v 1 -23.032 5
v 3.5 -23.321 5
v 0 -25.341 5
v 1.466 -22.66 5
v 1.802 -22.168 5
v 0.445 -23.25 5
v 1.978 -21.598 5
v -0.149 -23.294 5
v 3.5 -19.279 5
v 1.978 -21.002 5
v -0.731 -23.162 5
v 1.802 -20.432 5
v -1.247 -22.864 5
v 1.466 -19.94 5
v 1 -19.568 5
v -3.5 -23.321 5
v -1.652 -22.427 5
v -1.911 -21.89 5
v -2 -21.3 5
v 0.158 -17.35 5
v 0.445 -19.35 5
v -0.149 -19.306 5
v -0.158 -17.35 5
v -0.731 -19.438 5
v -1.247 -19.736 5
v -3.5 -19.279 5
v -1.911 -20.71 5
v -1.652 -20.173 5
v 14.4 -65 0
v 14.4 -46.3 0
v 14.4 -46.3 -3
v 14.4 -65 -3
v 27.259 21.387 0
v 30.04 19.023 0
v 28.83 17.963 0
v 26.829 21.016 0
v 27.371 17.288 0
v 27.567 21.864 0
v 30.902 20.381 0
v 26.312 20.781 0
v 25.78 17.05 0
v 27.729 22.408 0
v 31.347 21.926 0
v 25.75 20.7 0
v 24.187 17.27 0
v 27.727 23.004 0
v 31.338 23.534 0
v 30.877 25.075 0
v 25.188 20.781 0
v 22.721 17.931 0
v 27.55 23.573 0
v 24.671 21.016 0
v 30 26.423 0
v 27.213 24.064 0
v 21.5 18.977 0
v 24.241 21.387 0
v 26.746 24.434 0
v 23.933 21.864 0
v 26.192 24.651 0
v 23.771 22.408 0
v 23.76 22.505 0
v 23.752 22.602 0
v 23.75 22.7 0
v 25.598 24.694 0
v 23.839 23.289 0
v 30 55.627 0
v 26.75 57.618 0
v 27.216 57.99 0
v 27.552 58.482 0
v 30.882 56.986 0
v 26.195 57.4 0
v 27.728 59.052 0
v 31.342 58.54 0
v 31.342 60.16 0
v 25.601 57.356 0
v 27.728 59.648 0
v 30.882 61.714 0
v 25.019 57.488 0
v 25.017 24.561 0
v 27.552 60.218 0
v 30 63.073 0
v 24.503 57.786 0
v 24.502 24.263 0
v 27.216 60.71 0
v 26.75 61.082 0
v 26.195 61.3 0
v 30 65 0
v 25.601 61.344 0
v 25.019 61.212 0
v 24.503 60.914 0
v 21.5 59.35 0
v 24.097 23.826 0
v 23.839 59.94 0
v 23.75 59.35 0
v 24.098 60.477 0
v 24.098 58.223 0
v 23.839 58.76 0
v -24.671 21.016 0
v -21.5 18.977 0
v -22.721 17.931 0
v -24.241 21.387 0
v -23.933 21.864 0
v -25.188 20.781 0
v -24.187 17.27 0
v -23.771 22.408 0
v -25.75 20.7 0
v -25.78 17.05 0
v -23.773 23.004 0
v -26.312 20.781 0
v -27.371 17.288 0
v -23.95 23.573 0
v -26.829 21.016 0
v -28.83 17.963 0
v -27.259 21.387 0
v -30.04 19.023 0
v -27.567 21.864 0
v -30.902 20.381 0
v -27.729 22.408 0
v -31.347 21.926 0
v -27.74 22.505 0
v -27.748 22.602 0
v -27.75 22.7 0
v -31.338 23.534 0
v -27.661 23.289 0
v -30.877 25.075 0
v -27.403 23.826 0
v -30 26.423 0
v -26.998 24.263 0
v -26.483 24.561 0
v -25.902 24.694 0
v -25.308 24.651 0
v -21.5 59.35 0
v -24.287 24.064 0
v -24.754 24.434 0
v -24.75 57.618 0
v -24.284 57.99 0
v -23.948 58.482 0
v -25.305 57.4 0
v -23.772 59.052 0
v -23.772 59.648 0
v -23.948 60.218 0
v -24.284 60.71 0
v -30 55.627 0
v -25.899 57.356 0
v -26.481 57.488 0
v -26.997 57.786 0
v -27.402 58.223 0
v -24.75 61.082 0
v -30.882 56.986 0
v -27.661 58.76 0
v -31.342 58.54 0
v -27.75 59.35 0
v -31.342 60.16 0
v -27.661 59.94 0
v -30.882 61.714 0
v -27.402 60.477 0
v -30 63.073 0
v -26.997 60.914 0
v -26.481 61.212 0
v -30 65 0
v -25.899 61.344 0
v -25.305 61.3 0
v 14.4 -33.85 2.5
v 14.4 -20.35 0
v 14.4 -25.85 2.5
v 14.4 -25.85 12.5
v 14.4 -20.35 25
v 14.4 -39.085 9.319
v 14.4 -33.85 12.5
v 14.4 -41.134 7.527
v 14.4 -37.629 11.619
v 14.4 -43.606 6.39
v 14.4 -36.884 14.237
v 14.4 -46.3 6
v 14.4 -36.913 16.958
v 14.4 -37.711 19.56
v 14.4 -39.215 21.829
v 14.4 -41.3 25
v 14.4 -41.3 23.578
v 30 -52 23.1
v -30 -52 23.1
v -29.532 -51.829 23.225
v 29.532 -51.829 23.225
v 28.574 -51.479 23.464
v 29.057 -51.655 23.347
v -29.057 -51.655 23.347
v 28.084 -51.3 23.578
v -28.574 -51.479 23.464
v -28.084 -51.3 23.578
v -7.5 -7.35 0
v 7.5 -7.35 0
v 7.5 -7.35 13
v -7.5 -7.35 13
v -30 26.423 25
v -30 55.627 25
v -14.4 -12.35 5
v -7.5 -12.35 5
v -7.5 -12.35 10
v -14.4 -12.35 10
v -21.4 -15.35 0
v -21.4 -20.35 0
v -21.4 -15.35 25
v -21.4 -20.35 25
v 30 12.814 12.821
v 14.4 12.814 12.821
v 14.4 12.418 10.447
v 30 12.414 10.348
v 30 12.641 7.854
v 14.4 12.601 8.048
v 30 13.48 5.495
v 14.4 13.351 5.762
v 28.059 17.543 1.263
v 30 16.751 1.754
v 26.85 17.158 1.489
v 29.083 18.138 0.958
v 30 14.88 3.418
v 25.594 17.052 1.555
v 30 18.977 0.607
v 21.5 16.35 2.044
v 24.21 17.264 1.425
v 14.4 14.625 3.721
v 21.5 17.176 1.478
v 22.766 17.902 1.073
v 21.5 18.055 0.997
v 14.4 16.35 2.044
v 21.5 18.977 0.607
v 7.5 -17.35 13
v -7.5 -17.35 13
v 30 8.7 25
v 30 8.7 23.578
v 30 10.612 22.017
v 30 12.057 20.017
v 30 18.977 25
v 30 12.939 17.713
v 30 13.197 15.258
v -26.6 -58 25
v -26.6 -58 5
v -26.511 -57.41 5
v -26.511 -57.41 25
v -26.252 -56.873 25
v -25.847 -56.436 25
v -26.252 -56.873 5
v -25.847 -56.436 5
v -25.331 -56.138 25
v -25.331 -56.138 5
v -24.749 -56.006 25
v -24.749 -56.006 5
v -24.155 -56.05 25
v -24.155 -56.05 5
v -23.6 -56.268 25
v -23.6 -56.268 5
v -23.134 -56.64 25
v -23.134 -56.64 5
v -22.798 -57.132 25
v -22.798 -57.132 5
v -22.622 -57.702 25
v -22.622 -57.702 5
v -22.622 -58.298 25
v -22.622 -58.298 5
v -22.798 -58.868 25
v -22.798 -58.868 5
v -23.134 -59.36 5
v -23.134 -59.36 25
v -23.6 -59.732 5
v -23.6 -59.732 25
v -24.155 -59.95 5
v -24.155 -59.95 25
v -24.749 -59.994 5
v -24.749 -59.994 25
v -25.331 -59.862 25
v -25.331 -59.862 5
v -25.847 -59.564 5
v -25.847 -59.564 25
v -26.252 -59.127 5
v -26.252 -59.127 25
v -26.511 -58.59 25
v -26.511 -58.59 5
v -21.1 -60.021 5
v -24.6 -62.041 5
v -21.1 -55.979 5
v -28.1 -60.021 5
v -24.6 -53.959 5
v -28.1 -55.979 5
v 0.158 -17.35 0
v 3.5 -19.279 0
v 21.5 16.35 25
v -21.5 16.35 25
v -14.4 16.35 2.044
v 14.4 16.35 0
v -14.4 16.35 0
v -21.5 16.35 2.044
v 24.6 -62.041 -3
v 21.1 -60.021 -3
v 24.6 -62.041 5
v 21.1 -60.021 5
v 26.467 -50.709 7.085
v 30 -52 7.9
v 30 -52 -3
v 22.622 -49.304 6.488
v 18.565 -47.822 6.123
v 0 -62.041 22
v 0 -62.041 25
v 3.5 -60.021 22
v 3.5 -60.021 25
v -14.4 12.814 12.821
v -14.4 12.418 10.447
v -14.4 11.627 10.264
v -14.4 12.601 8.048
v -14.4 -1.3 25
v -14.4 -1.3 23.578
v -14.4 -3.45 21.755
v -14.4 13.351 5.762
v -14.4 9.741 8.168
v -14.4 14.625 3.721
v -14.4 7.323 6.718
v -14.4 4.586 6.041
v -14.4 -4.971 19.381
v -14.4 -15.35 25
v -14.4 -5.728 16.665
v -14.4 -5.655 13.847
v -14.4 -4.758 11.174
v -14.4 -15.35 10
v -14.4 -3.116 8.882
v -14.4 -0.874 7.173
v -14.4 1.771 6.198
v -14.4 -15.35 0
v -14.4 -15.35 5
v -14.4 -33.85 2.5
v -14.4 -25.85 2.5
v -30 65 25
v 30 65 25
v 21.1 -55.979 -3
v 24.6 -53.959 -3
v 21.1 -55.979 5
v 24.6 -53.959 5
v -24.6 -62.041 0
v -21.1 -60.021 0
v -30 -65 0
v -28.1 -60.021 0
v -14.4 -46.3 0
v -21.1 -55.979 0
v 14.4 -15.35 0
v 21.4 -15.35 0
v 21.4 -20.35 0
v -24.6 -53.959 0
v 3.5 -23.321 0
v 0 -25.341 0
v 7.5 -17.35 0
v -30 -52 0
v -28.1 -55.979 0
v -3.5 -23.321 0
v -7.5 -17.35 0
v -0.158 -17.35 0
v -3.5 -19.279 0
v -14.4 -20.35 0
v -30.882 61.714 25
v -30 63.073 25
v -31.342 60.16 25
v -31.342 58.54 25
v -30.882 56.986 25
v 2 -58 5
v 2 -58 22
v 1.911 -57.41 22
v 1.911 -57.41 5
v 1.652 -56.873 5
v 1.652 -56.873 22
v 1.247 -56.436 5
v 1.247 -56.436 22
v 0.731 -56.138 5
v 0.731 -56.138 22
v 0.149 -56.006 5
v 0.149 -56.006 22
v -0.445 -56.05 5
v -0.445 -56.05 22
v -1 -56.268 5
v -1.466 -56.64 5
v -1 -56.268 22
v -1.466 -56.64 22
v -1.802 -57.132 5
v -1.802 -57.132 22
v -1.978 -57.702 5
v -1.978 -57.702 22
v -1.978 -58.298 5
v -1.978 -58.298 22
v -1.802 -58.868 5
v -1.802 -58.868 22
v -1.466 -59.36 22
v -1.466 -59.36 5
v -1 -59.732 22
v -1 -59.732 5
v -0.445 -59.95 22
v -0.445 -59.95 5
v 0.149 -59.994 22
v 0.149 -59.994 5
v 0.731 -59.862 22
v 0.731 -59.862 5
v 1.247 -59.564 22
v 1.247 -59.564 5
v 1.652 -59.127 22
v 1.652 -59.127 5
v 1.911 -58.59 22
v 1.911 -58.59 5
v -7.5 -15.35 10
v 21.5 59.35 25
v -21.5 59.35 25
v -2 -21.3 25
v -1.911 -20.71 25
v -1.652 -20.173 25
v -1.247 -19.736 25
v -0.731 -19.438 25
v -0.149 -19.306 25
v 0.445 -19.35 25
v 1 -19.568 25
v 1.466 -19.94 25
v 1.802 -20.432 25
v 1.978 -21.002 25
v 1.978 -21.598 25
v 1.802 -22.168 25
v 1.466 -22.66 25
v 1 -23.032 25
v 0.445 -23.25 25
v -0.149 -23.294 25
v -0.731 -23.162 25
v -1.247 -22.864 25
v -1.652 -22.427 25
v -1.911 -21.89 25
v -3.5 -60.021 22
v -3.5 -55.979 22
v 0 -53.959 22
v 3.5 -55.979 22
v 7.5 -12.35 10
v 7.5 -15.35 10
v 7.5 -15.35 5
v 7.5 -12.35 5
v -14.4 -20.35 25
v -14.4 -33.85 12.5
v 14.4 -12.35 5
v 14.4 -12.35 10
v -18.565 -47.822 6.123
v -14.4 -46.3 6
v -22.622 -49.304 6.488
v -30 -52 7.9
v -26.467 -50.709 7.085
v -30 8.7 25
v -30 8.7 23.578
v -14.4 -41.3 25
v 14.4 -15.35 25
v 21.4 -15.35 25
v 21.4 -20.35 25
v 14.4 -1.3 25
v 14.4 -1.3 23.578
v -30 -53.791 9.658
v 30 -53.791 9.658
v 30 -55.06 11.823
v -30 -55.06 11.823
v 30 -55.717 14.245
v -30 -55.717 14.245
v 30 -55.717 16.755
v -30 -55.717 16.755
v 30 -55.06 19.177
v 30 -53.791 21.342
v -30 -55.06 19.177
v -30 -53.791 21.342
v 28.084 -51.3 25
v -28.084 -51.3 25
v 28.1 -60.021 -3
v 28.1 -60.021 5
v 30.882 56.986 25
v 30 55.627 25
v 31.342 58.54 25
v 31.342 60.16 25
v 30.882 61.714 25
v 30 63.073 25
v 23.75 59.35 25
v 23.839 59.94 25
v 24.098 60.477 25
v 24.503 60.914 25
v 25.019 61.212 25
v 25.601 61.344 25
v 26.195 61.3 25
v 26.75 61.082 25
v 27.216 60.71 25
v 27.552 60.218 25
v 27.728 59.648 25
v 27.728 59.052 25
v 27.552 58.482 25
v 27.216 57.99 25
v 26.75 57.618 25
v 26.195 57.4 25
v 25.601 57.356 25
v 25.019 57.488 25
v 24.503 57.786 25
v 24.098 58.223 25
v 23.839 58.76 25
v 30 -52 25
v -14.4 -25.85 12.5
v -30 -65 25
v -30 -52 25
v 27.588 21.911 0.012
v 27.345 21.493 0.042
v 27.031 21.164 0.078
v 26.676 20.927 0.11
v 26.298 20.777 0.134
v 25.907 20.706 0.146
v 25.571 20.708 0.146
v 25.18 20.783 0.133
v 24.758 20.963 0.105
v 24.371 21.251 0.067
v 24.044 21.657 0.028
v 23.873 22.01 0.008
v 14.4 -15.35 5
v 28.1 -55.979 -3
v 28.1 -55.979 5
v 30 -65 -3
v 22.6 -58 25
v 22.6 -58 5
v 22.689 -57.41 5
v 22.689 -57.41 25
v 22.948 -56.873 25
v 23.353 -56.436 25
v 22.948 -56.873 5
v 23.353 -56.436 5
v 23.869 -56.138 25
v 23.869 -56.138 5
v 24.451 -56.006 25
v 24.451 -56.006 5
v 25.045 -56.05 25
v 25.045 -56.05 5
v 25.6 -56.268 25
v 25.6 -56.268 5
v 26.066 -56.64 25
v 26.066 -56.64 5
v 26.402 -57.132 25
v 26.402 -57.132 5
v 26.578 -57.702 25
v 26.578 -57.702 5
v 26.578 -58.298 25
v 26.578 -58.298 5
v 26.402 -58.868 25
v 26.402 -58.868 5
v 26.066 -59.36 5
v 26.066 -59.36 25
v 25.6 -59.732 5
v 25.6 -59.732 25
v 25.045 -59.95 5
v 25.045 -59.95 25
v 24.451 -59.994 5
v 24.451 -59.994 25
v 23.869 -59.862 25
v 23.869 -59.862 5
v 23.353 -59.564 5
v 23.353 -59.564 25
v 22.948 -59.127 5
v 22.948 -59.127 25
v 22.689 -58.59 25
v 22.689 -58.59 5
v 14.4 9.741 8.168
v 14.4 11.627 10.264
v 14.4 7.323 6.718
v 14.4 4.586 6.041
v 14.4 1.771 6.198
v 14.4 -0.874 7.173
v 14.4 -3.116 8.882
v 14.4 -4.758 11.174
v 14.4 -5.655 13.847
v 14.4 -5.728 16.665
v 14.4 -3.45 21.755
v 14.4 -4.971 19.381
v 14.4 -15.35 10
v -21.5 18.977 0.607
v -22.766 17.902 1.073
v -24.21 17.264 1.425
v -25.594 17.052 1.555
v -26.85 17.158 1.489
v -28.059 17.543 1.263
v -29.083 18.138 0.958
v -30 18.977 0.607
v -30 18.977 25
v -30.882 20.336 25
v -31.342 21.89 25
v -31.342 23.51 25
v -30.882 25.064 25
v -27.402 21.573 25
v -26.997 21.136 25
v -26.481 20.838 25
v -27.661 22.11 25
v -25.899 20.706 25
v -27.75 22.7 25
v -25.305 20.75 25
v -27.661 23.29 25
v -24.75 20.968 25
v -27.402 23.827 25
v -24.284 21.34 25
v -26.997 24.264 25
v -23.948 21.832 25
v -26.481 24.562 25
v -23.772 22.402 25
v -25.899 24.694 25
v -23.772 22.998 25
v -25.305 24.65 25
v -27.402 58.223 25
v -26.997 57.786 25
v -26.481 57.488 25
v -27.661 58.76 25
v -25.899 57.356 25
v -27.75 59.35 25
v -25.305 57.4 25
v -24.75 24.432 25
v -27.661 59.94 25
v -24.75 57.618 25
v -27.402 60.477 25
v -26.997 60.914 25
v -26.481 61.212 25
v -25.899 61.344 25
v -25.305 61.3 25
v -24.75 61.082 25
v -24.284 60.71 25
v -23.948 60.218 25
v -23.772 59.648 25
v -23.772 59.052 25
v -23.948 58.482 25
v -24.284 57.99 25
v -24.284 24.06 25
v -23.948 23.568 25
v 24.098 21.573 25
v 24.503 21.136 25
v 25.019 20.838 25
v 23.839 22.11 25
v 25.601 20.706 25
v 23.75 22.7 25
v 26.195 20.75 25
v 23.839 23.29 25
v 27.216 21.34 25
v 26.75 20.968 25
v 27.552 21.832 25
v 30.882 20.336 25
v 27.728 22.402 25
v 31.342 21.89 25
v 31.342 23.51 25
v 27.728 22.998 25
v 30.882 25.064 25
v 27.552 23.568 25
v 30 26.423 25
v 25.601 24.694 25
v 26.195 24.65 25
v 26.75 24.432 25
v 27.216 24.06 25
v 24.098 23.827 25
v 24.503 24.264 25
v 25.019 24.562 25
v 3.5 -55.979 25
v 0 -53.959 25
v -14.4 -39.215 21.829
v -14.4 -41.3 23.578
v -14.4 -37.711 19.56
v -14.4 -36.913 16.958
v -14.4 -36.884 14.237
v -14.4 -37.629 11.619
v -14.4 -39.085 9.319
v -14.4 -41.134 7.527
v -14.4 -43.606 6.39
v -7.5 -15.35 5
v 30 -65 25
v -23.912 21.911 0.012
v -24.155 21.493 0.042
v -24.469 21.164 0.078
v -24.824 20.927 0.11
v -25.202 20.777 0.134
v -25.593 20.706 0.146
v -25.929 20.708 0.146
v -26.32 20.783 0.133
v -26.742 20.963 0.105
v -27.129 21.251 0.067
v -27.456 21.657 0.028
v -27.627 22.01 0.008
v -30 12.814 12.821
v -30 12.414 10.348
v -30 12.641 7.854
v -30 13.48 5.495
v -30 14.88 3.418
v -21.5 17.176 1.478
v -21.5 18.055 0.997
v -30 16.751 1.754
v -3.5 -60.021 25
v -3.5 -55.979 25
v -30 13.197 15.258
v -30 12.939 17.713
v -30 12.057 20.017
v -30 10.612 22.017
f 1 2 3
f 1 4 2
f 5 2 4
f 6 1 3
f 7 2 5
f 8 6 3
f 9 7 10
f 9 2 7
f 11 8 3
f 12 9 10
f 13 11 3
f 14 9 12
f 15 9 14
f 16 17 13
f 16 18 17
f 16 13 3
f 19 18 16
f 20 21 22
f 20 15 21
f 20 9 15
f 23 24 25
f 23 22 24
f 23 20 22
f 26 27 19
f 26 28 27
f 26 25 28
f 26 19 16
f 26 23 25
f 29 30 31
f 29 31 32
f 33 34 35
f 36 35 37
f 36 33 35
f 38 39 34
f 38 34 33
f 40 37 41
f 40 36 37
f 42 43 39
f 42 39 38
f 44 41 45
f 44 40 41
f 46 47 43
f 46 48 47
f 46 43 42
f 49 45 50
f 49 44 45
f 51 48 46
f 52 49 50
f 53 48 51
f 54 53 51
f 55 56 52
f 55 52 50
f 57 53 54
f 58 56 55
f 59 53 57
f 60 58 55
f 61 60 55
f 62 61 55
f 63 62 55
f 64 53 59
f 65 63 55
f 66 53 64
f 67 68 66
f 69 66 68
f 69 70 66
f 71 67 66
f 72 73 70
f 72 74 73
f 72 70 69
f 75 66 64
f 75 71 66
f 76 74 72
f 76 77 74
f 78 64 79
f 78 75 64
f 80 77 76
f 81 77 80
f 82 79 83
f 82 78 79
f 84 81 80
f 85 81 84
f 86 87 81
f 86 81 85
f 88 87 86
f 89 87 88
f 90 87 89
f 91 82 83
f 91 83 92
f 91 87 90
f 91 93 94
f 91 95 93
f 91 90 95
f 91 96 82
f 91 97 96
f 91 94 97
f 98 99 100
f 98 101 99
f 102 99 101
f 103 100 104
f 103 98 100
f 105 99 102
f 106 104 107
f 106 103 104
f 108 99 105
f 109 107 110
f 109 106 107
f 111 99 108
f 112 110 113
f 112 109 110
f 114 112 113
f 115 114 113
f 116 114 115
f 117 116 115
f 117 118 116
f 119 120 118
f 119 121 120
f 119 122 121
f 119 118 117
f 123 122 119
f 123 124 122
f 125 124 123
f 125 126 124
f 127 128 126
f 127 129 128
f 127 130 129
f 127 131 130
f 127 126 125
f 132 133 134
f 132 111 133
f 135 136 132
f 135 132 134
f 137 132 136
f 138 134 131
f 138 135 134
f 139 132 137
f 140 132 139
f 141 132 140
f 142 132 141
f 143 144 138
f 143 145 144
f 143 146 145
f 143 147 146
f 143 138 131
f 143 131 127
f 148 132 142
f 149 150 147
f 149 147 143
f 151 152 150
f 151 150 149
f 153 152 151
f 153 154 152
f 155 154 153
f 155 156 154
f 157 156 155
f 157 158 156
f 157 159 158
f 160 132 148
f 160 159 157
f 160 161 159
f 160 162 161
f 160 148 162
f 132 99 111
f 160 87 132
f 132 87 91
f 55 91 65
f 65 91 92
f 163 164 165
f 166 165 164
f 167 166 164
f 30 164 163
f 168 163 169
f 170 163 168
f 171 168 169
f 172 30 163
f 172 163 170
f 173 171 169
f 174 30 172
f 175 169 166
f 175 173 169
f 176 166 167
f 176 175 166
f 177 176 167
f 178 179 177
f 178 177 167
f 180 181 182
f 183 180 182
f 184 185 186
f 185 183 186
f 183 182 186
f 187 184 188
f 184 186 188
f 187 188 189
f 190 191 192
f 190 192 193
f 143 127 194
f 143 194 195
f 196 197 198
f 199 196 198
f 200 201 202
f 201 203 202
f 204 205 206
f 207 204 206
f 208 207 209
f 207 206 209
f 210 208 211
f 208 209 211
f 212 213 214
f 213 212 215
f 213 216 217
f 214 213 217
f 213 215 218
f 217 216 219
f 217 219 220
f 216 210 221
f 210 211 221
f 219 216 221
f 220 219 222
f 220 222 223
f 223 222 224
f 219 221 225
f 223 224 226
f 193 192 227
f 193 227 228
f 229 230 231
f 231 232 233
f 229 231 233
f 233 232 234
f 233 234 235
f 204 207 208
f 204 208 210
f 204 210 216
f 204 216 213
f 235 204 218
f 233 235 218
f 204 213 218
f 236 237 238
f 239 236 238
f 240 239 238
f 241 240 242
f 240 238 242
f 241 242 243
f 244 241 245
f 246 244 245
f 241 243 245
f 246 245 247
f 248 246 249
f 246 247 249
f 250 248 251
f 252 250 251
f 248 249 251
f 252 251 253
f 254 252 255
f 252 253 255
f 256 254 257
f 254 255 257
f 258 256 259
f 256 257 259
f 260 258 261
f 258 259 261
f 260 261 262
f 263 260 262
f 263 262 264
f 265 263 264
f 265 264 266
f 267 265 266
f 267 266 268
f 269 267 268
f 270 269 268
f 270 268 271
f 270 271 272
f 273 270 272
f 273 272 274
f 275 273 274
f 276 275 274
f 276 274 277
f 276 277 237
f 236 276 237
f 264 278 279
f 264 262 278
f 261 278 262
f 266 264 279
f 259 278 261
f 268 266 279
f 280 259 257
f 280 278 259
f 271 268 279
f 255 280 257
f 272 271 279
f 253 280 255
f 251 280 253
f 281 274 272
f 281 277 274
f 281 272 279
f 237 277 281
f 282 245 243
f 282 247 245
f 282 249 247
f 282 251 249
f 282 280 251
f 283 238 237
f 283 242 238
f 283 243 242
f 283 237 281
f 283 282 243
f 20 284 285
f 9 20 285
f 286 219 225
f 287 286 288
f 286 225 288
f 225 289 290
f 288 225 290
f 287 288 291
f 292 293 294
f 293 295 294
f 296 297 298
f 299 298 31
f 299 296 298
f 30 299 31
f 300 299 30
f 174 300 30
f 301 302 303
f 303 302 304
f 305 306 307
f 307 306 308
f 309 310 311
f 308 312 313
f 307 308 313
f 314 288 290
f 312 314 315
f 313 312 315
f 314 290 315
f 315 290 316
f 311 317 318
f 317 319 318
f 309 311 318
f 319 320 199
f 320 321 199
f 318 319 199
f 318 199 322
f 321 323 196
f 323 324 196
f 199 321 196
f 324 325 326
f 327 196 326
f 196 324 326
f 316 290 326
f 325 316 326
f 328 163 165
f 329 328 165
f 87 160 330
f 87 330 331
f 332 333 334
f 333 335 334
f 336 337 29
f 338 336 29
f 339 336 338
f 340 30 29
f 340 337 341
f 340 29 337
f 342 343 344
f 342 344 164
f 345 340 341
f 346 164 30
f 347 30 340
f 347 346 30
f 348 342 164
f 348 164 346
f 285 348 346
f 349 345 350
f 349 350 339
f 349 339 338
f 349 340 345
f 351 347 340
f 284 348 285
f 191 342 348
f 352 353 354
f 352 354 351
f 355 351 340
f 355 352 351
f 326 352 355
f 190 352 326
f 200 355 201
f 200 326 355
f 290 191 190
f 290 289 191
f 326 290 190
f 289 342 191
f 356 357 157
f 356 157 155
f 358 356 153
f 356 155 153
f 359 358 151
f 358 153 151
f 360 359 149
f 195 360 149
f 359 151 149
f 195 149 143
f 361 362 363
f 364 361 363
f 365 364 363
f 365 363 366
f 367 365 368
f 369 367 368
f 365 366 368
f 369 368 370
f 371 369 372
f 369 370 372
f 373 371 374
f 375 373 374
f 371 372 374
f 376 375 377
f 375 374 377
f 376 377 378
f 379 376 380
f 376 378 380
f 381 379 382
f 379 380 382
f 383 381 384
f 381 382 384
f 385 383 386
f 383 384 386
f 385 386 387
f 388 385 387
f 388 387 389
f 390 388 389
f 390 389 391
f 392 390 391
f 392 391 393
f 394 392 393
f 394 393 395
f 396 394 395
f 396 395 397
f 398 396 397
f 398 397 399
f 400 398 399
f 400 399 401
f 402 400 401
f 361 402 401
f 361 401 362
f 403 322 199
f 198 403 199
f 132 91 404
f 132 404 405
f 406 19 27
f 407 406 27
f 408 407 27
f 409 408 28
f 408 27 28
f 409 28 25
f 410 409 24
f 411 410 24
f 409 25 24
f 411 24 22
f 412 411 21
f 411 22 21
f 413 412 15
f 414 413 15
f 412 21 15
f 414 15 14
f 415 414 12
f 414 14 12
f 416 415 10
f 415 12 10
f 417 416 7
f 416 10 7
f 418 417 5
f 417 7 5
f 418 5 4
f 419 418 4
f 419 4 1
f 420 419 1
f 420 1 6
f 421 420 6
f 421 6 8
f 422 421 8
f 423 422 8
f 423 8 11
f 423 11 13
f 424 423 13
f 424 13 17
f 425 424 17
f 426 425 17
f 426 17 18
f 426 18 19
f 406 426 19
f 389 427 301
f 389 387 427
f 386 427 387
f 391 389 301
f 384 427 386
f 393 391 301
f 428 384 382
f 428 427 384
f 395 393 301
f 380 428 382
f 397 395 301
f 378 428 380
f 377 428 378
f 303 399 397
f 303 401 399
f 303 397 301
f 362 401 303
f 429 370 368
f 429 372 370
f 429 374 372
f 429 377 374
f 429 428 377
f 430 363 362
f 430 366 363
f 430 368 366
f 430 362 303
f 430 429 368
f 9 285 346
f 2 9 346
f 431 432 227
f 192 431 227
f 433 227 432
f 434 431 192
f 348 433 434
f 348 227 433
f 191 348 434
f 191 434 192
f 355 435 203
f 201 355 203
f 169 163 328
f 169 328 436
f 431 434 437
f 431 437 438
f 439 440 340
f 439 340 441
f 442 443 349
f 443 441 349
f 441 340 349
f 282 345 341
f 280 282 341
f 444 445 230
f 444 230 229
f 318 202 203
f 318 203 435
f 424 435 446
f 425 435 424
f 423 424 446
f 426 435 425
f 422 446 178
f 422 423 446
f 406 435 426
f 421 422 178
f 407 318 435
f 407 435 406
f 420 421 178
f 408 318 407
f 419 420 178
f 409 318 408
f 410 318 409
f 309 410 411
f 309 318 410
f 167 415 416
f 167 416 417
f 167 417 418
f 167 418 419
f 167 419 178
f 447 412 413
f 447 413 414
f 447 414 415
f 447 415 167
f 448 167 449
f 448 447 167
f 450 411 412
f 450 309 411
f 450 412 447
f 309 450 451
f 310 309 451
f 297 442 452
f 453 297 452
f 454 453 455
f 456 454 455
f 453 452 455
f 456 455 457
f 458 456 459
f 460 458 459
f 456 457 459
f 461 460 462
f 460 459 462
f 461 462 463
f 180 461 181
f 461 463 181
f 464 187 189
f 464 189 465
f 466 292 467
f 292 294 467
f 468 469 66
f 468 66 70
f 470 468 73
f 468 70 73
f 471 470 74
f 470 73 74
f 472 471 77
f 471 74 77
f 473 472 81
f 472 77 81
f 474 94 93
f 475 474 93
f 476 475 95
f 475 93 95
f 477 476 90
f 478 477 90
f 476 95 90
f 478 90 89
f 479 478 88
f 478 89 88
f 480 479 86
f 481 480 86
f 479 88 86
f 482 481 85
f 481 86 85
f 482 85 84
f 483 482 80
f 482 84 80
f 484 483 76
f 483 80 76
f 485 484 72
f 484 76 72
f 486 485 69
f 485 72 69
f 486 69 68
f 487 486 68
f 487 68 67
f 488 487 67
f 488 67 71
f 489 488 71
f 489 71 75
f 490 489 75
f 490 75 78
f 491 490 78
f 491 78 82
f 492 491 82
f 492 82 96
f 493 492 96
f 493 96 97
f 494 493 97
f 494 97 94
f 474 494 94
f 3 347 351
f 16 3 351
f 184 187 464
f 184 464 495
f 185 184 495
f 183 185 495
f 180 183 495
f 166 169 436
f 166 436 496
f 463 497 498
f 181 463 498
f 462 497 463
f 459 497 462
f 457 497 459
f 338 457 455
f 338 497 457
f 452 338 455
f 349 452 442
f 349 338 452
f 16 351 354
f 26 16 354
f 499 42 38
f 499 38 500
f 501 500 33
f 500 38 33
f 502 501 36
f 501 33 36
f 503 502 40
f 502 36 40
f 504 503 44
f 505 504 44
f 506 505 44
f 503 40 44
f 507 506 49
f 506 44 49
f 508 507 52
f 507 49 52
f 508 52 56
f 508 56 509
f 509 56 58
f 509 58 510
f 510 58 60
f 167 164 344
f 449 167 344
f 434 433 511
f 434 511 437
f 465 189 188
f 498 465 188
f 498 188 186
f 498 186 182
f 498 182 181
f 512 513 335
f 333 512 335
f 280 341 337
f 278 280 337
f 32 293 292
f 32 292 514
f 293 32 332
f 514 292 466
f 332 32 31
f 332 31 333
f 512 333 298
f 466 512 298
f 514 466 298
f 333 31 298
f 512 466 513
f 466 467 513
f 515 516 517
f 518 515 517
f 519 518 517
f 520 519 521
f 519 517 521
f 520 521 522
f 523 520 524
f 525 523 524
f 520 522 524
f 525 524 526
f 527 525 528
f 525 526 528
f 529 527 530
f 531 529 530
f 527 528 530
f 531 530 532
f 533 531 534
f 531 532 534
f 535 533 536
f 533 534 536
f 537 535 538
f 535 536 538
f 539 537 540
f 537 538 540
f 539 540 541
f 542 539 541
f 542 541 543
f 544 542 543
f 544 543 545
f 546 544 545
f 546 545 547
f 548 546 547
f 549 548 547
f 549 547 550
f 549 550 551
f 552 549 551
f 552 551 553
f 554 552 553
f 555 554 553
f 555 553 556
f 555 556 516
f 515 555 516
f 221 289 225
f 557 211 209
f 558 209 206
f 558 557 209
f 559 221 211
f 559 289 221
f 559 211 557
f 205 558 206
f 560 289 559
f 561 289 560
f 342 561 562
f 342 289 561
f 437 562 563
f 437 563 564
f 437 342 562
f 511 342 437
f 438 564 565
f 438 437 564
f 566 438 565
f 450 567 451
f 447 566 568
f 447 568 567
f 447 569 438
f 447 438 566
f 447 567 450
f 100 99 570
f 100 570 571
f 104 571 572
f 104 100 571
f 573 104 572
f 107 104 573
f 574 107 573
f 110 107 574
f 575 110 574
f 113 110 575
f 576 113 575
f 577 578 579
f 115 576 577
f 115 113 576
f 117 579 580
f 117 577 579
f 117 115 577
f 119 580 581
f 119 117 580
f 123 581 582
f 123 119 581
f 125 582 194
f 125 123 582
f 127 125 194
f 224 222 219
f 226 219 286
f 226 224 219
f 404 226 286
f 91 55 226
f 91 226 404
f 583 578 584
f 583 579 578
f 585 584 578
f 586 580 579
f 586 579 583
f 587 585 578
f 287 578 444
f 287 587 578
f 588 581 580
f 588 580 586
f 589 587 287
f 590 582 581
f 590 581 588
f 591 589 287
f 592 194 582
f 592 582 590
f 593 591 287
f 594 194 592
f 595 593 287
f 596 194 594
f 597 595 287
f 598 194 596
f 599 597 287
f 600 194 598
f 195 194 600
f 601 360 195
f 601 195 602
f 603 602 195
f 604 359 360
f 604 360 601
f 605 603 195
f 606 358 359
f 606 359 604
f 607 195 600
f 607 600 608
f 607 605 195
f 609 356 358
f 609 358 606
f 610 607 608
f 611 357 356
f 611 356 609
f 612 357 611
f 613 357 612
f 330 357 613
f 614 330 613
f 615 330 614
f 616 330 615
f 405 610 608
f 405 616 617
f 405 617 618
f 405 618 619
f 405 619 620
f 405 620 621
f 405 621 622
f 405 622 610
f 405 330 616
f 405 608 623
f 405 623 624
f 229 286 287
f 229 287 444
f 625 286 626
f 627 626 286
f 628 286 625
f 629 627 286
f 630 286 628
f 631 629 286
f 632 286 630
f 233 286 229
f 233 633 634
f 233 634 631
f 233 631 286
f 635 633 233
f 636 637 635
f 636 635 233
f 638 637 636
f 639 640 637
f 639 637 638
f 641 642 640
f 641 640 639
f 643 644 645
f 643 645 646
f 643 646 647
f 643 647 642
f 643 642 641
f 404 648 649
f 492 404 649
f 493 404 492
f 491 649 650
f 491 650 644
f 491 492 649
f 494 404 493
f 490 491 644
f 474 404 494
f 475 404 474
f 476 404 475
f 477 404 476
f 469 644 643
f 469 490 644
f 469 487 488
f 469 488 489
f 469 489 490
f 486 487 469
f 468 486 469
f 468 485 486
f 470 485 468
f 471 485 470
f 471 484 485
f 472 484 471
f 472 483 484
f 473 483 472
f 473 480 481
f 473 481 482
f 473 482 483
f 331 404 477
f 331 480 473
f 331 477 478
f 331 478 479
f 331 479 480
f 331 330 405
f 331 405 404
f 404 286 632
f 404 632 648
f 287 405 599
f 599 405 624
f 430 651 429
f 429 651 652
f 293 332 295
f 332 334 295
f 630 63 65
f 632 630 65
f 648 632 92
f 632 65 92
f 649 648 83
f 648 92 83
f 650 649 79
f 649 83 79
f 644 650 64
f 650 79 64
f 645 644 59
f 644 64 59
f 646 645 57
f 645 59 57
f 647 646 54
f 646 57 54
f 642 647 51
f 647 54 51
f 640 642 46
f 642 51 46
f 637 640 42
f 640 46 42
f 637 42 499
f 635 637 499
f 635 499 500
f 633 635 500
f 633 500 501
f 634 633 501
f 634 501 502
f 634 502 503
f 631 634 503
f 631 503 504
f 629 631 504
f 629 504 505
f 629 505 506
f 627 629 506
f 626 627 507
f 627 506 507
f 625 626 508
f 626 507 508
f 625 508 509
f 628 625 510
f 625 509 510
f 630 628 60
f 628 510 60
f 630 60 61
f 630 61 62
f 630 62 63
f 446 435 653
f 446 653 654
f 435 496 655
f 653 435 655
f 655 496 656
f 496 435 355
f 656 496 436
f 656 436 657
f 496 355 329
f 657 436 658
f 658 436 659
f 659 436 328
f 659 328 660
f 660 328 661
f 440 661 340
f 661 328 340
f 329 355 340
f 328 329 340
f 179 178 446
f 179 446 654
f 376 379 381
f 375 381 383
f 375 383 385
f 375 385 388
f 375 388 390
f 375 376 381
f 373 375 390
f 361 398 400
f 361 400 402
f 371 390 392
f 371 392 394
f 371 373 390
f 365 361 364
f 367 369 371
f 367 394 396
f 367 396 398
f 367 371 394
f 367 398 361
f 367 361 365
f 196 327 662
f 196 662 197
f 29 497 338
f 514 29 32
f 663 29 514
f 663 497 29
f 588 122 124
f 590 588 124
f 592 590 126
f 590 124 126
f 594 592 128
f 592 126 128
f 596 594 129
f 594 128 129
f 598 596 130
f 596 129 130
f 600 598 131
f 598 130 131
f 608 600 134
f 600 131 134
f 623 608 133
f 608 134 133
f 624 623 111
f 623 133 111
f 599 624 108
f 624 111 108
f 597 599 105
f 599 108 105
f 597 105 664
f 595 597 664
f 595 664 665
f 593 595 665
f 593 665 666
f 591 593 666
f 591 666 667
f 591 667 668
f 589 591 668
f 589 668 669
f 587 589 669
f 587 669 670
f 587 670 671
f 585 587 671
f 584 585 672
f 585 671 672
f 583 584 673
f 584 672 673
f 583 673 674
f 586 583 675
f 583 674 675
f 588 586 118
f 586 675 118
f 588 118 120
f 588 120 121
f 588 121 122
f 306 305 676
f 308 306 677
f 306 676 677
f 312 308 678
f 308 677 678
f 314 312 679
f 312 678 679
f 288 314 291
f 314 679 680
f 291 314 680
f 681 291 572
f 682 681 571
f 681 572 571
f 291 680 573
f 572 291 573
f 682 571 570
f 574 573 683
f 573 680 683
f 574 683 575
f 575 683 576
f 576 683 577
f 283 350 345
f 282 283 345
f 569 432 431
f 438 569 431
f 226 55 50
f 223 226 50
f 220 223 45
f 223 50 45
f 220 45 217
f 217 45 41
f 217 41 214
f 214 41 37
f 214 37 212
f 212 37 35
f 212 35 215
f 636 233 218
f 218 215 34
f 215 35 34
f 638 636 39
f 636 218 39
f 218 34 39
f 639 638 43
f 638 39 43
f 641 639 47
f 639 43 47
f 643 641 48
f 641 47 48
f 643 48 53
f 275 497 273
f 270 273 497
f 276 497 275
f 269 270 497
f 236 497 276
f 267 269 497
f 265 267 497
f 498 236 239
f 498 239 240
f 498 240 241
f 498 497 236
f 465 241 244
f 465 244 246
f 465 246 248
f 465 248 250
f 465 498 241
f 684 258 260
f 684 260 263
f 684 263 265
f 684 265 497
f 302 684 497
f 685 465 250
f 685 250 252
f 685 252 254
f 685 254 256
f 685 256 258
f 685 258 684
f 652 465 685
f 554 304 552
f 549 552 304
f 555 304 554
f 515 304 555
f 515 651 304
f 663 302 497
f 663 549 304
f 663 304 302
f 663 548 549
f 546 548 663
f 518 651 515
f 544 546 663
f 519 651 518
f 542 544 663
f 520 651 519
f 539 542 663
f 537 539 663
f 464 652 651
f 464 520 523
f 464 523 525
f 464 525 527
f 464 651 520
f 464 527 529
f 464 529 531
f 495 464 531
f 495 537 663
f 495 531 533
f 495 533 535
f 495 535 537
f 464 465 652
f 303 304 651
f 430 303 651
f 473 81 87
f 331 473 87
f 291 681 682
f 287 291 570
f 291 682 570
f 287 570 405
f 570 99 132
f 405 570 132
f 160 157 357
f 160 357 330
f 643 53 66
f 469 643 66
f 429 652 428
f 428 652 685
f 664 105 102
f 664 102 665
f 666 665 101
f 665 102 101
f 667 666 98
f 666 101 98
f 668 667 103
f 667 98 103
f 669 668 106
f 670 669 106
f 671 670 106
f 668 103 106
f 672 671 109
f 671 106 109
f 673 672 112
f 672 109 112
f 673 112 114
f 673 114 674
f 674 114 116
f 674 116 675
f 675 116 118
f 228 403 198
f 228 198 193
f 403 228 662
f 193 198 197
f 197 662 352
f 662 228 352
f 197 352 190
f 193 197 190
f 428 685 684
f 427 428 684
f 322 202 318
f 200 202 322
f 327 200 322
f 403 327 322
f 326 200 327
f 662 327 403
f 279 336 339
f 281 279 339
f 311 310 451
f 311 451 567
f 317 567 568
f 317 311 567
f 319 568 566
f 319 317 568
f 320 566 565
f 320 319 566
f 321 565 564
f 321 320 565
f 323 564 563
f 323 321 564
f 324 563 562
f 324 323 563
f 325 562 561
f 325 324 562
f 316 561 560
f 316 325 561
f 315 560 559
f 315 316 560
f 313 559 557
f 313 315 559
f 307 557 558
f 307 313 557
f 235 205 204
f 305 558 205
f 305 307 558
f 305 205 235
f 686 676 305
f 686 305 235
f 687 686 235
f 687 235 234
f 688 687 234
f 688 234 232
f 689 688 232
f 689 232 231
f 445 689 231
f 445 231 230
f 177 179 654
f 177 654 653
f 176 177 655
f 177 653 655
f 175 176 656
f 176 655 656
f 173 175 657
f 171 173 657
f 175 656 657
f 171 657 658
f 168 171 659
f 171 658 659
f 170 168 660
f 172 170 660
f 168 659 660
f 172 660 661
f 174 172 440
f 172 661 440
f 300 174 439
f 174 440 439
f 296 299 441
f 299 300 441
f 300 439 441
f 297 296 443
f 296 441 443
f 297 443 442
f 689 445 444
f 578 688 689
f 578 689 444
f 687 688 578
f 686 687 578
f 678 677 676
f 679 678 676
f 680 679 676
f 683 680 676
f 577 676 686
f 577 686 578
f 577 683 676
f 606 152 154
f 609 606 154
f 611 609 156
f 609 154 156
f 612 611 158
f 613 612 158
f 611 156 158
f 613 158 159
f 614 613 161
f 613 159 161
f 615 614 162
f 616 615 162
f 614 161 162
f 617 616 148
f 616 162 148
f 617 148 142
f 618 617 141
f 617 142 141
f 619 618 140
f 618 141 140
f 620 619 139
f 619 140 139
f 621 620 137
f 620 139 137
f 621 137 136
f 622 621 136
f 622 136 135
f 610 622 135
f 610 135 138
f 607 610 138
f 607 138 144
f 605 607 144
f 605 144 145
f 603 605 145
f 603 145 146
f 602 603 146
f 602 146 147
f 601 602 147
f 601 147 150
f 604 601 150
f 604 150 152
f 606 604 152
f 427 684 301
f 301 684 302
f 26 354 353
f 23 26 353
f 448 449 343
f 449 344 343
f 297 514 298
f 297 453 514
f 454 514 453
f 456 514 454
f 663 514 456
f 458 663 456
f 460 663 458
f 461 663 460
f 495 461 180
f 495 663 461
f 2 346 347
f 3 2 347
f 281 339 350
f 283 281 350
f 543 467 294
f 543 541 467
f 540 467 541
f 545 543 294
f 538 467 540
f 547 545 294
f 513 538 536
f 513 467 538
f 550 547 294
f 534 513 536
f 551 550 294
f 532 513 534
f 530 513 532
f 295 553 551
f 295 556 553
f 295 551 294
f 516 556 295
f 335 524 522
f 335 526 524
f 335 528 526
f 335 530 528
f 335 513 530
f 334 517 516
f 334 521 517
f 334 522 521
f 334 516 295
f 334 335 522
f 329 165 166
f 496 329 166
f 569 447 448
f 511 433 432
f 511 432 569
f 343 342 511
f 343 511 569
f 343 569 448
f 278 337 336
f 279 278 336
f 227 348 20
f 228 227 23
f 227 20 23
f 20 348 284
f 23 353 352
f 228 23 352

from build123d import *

# Parameters (mm, degrees)
SKETCH_1_W          = 60
SKETCH_1_H          = 130
EXTRUDE_1_DEPTH     = 25
SKETCH_2_W          = 43
SKETCH_2_H          = 43
CUT_EXTRUDE_1_DEPTH = 76.828754441
SKETCH_3_W          = 10
SKETCH_3_H          = 8
CUT_EXTRUDE_2_DEPTH = 92.923881554
FILLET_1_R          = 20
FILLET_2_R          = 10
SKETCH_4_R          = 2
CUT_EXTRUDE_3_DEPTH = 76.828754441
EXTRUDE_2_REACH     = 77.829
SKETCH_5_R          = 4.25
SKETCH_5_R_2        = 2
SKETCH_6_R          = 2
EXTRUDE_3_DEPTH     = 25
CUT_EXTRUDE_4_DEPTH = 5
SKETCH_8_R          = 2
CUT_EXTRUDE_5_DEPTH = 20
CUT_EXTRUDE_6_DEPTH = 3
SKETCH_11_W         = 7
SKETCH_11_H         = 5
EXTRUDE_5_DEPTH     = 7
SKETCH_12_W         = 7
SKETCH_12_H         = 5
EXTRUDE_6_DEPTH     = 7
SKETCH_13_W         = 7
SKETCH_13_H         = 5
EXTRUDE_7_DEPTH     = 4
SKETCH_17_W         = 7
SKETCH_17_H         = 5
EXTRUDE_8_DEPTH     = 14
EXTRUDE_9_DEPTH     = 3
SKETCH_19_W         = 5
SKETCH_19_H         = 3
CUT_EXTRUDE_7_DEPTH = 84.352504546
SKETCH_20_W         = 15
SKETCH_20_H         = 10
CUT_EXTRUDE_8_DEPTH = 13


with BuildPart() as part:
    # Эскиз1 → Бобышка-Вытянуть1 (new body)
    with BuildSketch(Plane.XY):
        Rectangle(SKETCH_1_W, SKETCH_1_H)
    extrude(amount=EXTRUDE_1_DEPTH)

    # Эскиз2 → Вырез-Вытянуть1 (cut, through all)
    with BuildSketch(Plane(origin=(0, 0, 0), x_dir=(-1, 0, 0), z_dir=(0, 0, -1))):
        Polygon((-30, 3.7), (-14.4, 3.7), (-14.4, -46.3), (-30, -52), align=None)
        with Locations((0, 37.85)):
            Rectangle(SKETCH_2_W, SKETCH_2_H)
        Polygon((14.4, -46.3), (30, -52), (30, 3.7), (14.4, 3.7), align=None)
    extrude(amount=-CUT_EXTRUDE_1_DEPTH, mode=Mode.SUBTRACT)

    # Эскиз3 → Вырез-Вытянуть2 (cut, through all)
    with BuildSketch(Plane.ZY.offset(30)):
        with BuildLine():
            Line((23.577747211, 8.7), (25, 8.7))
            Line((25, 8.7), (25, 3.7))
            Line((25, 3.7), (25, -1.3))
            Line((25, -1.3), (23.577747211, -1.3))
            ThreePointArc((23.577747211, -1.3), (6, 3.7), (23.577747211, 8.7))
        make_face()
        with BuildLine():
            Line((25, -41.3), (23.577747211, -41.3))
            ThreePointArc((23.577747211, -41.3), (10.144669889, -38.453316662), (7.9, -52))
            Line((7.9, -52), (23.1, -52))
            ThreePointArc((23.1, -52), (23.346683338, -51.655330111), (23.577747211, -51.3))
            Line((23.577747211, -51.3), (25, -51.3))
            Line((25, -51.3), (25, -46.3))
            Line((25, -46.3), (25, -41.3))
        make_face()
        with Locations((7.5, -29.85)):
            Rectangle(SKETCH_3_W, SKETCH_3_H)
        with BuildLine():
            Line((23.1, -52), (7.9, -52))
            ThreePointArc((7.9, -52), (15.5, -55.8), (23.1, -52))
        make_face()
    extrude(amount=-CUT_EXTRUDE_2_DEPTH, mode=Mode.SUBTRACT)

    # Скругление1
    # the kernel refuses this fillet: 20 mm, written as the material it takes off along each edge
    with BuildSketch(Plane(origin=(-65.707142143, 3.7, 0), x_dir=(0, 1, 0), z_dir=(1, 0, 0))) as fillet_1_piece_1:
        with BuildLine():
            CenterArc((14.282856857, 20), FILLET_1_R, 224.427004001, 45.572995999)
            Line((0, 6), (-0.285657137, 5.72))
            ThreePointArc((-0.285657137, 5.72), (-0.4, 3), (-0.4, 0))
            Line((-0.4, 0), (0, -0.4))
            Line((0, -0.4), (14.282856857, -0.4))
            Line((14.282856857, -0.4), (14.282856857, 0))
        make_face()
    extrude(amount=51.307142143, mode=Mode.SUBTRACT)
    with BuildSketch(Plane(origin=(-65.707142143, 3.7, 0), x_dir=(0, 1, 0), z_dir=(1, 0, 0))) as fillet_1_piece_2_section:
        with BuildLine():
            CenterArc((14.282856857, 20), FILLET_1_R, 224.427004001, 45.572995999)
            Line((0, 6), (-0.285657137, 5.72))
            ThreePointArc((-0.285657137, 5.72), (-0.4, 3), (-0.4, 0))
            Line((-0.4, 0), (0, -0.4))
            Line((0, -0.4), (14.282856857, -0.4))
            Line((14.282856857, -0.4), (14.282856857, 0))
        make_face()
    fillet_1_piece_2 = extrude(amount=87.014284285, mode=Mode.PRIVATE)
    fillet_1_piece_2 = split(fillet_1_piece_2, bisect_by=Plane(origin=(14.4, 3.7, 0), z_dir=(1, 0, 0)), keep=Keep.TOP, mode=Mode.PRIVATE)
    add(fillet_1_piece_2, mode=Mode.SUBTRACT)
    with BuildSketch(Plane(origin=(65.707142143, 3.7, 0), x_dir=(0, 1, 0), z_dir=(-1, 0, 0))) as fillet_1_piece_3:
        with BuildLine():
            CenterArc((14.282856857, -20), FILLET_1_R, 90, 45.572995999)
            Line((0, -6), (-0.285657137, -5.72))
            ThreePointArc((-0.285657137, -5.72), (-0.4, -3), (-0.4, 0))
            Line((-0.4, 0), (0, 0.4))
            Line((0, 0.4), (14.282856857, 0.4))
            Line((14.282856857, 0.4), (14.282856857, 0))
        make_face()
    extrude(amount=51.307142143, mode=Mode.SUBTRACT)
    with BuildSketch(Plane(origin=(65.707142143, 3.7, 0), x_dir=(0, 1, 0), z_dir=(-1, 0, 0))) as fillet_1_piece_4_section:
        with BuildLine():
            CenterArc((14.282856857, -20), FILLET_1_R, 90, 45.572995999)
            Line((0, -6), (-0.285657137, -5.72))
            ThreePointArc((-0.285657137, -5.72), (-0.4, -3), (-0.4, 0))
            Line((-0.4, 0), (0, 0.4))
            Line((0, 0.4), (14.282856857, 0.4))
            Line((14.282856857, 0.4), (14.282856857, 0))
        make_face()
    fillet_1_piece_4 = extrude(amount=87.014284285, mode=Mode.PRIVATE)
    fillet_1_piece_4 = split(fillet_1_piece_4, bisect_by=Plane(origin=(-14.4, 3.7, 0), z_dir=(-1, 0, 0)), keep=Keep.TOP, mode=Mode.PRIVATE)
    add(fillet_1_piece_4, mode=Mode.SUBTRACT)

    # Скругление2
    # the kernel refuses this fillet: 10 mm, written as the material it takes off along each edge
    with BuildSketch(Plane(origin=(-79.117206761, 3.7, 6), x_dir=(-2.6805272160388098e-14, 0.8006407690254324, 0.5991446895152824), z_dir=(1, 0, 0))) as fillet_2_piece_1:
        with BuildLine():
            CenterArc((17.375195996, -8.00640769), FILLET_2_R, 126.808665073, 106.382669854)
            Line((11.383749101, -16.012815381), (10.784604411, -16.81345615))
            ThreePointArc((10.784604411, -16.81345615), (7.241424671, -14.16198322), (-0.991173158, -0.132573646))
            Line((-0.991173158, -0.132573646), (0.59914469, 0.800640769))
            ThreePointArc((0.59914469, 0.800640769), (5.69187455, -0.893912694), (10.784604411, 0.800640769))
            Line((10.784604411, 0.800640769), (11.383749101, 0))
        make_face()
    extrude(amount=64.717206761, mode=Mode.SUBTRACT)
    with BuildSketch(Plane(origin=(-79.117206761, 3.7, 6), x_dir=(-2.6805272160388098e-14, 0.8006407690254324, 0.5991446895152824), z_dir=(1, 0, 0))) as fillet_2_piece_2_section:
        with BuildLine():
            CenterArc((17.375195996, -8.00640769), FILLET_2_R, 126.808665073, 106.382669854)
            Line((11.383749101, -16.012815381), (10.784604411, -16.81345615))
            ThreePointArc((10.784604411, -16.81345615), (7.241424671, -14.16198322), (-0.991173158, -0.132573646))
            Line((-0.991173158, -0.132573646), (0.59914469, 0.800640769))
            ThreePointArc((0.59914469, 0.800640769), (5.69187455, -0.893912694), (10.784604411, 0.800640769))
            Line((10.784604411, 0.800640769), (11.383749101, 0))
        make_face()
    fillet_2_piece_2 = extrude(amount=113.834413522, mode=Mode.PRIVATE)
    fillet_2_piece_2 = split(fillet_2_piece_2, bisect_by=Plane(origin=(14.4, 3.7, 6), z_dir=(1, 0, 0)), keep=Keep.TOP, mode=Mode.PRIVATE)
    add(fillet_2_piece_2, mode=Mode.SUBTRACT)
    with BuildSketch(Plane(origin=(79.117206761, 3.7, 6), x_dir=(9.676973105025612e-15, 0.8006407690254272, 0.5991446895152894), z_dir=(-1, 0, 0))) as fillet_2_piece_3:
        with BuildLine():
            CenterArc((17.375195996, 8.00640769), FILLET_2_R, 126.808665073, 106.382669854)
            Line((11.383749101, 16.012815381), (10.784604411, 16.81345615))
            ThreePointArc((10.784604411, 16.81345615), (7.241424671, 14.16198322), (-0.991173158, 0.132573646))
            Line((-0.991173158, 0.132573646), (0.59914469, -0.800640769))
            ThreePointArc((0.59914469, -0.800640769), (5.69187455, 0.893912694), (10.784604411, -0.800640769))
            Line((10.784604411, -0.800640769), (11.383749101, 0))
        make_face()
    extrude(amount=64.717206761, mode=Mode.SUBTRACT)
    with BuildSketch(Plane(origin=(79.117206761, 3.7, 6), x_dir=(9.676973105025612e-15, 0.8006407690254272, 0.5991446895152894), z_dir=(-1, 0, 0))) as fillet_2_piece_4_section:
        with BuildLine():
            CenterArc((17.375195996, 8.00640769), FILLET_2_R, 126.808665073, 106.382669854)
            Line((11.383749101, 16.012815381), (10.784604411, 16.81345615))
            ThreePointArc((10.784604411, 16.81345615), (7.241424671, 14.16198322), (-0.991173158, 0.132573646))
            Line((-0.991173158, 0.132573646), (0.59914469, -0.800640769))
            ThreePointArc((0.59914469, -0.800640769), (5.69187455, 0.893912694), (10.784604411, -0.800640769))
            Line((10.784604411, -0.800640769), (11.383749101, 0))
        make_face()
    fillet_2_piece_4 = extrude(amount=113.834413522, mode=Mode.PRIVATE)
    fillet_2_piece_4 = split(fillet_2_piece_4, bisect_by=Plane(origin=(-14.4, 3.7, 6), z_dir=(-1, 0, 0)), keep=Keep.TOP, mode=Mode.PRIVATE)
    add(fillet_2_piece_4, mode=Mode.SUBTRACT)

    # Эскиз4 → Вырез-Вытянуть3 (cut, through all)
    with BuildSketch(Plane(origin=(0, 0, 0), x_dir=(-1, 0, 0), z_dir=(0, 0, -1))):
        with Locations((-24.6, -58)):
            Circle(SKETCH_4_R)
        with Locations((24.6, -58)):
            Circle(SKETCH_4_R)
        with Locations((0, -21.3)):
            Circle(SKETCH_4_R)
        with Locations((-25.75, 22.7)):
            Circle(SKETCH_4_R)
        with Locations((25.75, 22.7)):
            Circle(SKETCH_4_R)
        with Locations((25.75, 59.35)):
            Circle(SKETCH_4_R)
        with Locations((-25.75, 59.35)):
            Circle(SKETCH_4_R)
    extrude(amount=-CUT_EXTRUDE_3_DEPTH, mode=Mode.SUBTRACT)

    # Эскиз5 → Бобышка-Вытянуть2 (add, up to next)
    with BuildSketch(Plane(origin=(0, 0, 0), x_dir=(-1, 0, 0), z_dir=(0, 0, -1)), mode=Mode.PRIVATE) as extrude_2_sk1:
        with Locations((25.75, 22.7)):
            Circle(SKETCH_5_R)
        with Locations((25.75, 22.7)):
            Circle(SKETCH_5_R_2, mode=Mode.SUBTRACT)
    extrude_2_tool1 = extrude(extrude_2_sk1.sketch, amount=-EXTRUDE_2_REACH, mode=Mode.PRIVATE) - part.part
    # Эскиз5 → Бобышка-Вытянуть2 (add, up to next)
    with BuildSketch(Plane(origin=(0, 0, 0), x_dir=(-1, 0, 0), z_dir=(0, 0, -1)), mode=Mode.PRIVATE) as extrude_2_sk2:
        with Locations((-25.75, 22.7)):
            Circle(SKETCH_5_R)
        with Locations((-25.75, 22.7)):
            Circle(SKETCH_5_R_2, mode=Mode.SUBTRACT)
    extrude_2_tool2 = extrude(extrude_2_sk2.sketch, amount=-EXTRUDE_2_REACH, mode=Mode.PRIVATE) - part.part
    add(extrude_2_tool1.solids().sort_by_distance((-21.620208, 22.7, 0))[0])
    add(extrude_2_tool2.solids().sort_by_distance((29.879792, 22.7, 0))[0])

    # Эскиз6 → Бобышка-Вытянуть3 (add)
    # profile 1 of 4: a face of its own
    with BuildSketch(Plane(origin=(0, 0, 0), x_dir=(-1, 0, 0), z_dir=(0, 0, -1))):
        with BuildLine():
            Line((-21.5, 26.422902094), (-21.5, 18.977097906))
            ThreePointArc((-21.5, 18.977097906), (-31.4, 22.7), (-21.5, 26.422902094))
        make_face()
        with Locations((-25.75, 22.7)):
            Circle(SKETCH_6_R, mode=Mode.SUBTRACT)
    # profile 2 of 4: a face of its own
    with BuildSketch(Plane(origin=(0, 0, 0), x_dir=(-1, 0, 0), z_dir=(0, 0, -1))):
        with BuildLine():
            Line((21.5, 59.35), (20.1, 59.35))
            ThreePointArc((20.1, 59.35), (31.038430769, 61.33871818), (21.5, 55.627097906))
            Line((21.5, 55.627097906), (21.5, 59.35))
        make_face()
        with Locations((25.75, 59.35)):
            Circle(SKETCH_6_R, mode=Mode.SUBTRACT)
    # profile 3 of 4: a face of its own
    with BuildSketch(Plane(origin=(0, 0, 0), x_dir=(-1, 0, 0), z_dir=(0, 0, -1))):
        with BuildLine():
            Line((-21.5, 59.35), (-21.5, 55.627097906))
            ThreePointArc((-21.5, 55.627097906), (-31.038430769, 61.33871818), (-20.1, 59.35))
            Line((-20.1, 59.35), (-21.5, 59.35))
        make_face()
        with Locations((-25.75, 59.35)):
            Circle(SKETCH_6_R, mode=Mode.SUBTRACT)
    # profile 4 of 4: a face of its own
    with BuildSketch(Plane(origin=(0, 0, 0), x_dir=(-1, 0, 0), z_dir=(0, 0, -1))):
        with BuildLine():
            Line((21.5, 26.422902094), (21.5, 18.977097906))
            ThreePointArc((21.5, 18.977097906), (31.4, 22.7), (21.5, 26.422902094))
        make_face()
        with Locations((25.75, 22.7)):
            Circle(SKETCH_6_R, mode=Mode.SUBTRACT)
    extrude(amount=-EXTRUDE_3_DEPTH)

    # Эскиз7 → Вырез-Вытянуть4 (cut)
    with BuildSketch(Plane(origin=(0, 0, 0), x_dir=(-1, 0, 0), z_dir=(0, 0, -1))):
        Polygon((0, -17.258548116), (-3.5, -19.279274058), (-3.5, -23.320725942), (0, -25.341451884), (3.5, -23.320725942), (3.5, -19.279274058), align=None)
        Polygon((-24.6, -53.958548116), (-28.1, -55.979274058), (-28.1, -60.020725942), (-24.6, -62.041451884), (-21.1, -60.020725942), (-21.1, -55.979274058), align=None)
        Polygon((24.6, -53.958548116), (21.1, -55.979274058), (21.1, -60.020725942), (24.6, -62.041451884), (28.1, -60.020725942), (28.1, -55.979274058), align=None)
    extrude(amount=-CUT_EXTRUDE_4_DEPTH, mode=Mode.SUBTRACT)

    # Эскиз8 → Вырез-Вытянуть5 (cut)
    with BuildSketch(Plane.XY.offset(25)):
        with Locations((0, -58)):
            Circle(SKETCH_8_R)
    extrude(amount=-CUT_EXTRUDE_5_DEPTH, mode=Mode.SUBTRACT)

    # Эскиз9 → Вырез-Вытянуть6 (cut)
    with BuildSketch(Plane.XY.offset(25)):
        Polygon((0, -53.958548116), (-3.5, -55.979274058), (-3.5, -60.020725942), (0, -62.041451884), (3.5, -60.020725942), (3.5, -55.979274058), align=None)
    extrude(amount=-CUT_EXTRUDE_6_DEPTH, mode=Mode.SUBTRACT)

    # Эскиз11 → Бобышка-Вытянуть5 (add)
    with BuildSketch(Plane(origin=(14.4, 0, 0), x_dir=(0, 0, -1), z_dir=(1, 0, 0))):
        with Locations((-7.5, -17.85)):
            Rectangle(SKETCH_11_W, SKETCH_11_H)
    extrude(amount=EXTRUDE_5_DEPTH)

    # Эскиз12 → Бобышка-Вытянуть6 (add)
    with BuildSketch(Plane.ZY.offset(14.4)):
        with Locations((7.5, -17.85)):
            Rectangle(SKETCH_12_W, SKETCH_12_H)
    extrude(amount=EXTRUDE_6_DEPTH)

    # Эскиз13 → Бобышка-Вытянуть7 (add)
    with BuildSketch(Plane(origin=(0, 0, 4), x_dir=(-1, 0, 0), z_dir=(0, 0, -1))):
        with Locations((17.9, -17.85)):
            Rectangle(SKETCH_13_W, SKETCH_13_H)
        with Locations((-17.9, -17.85)):
            Rectangle(SKETCH_13_W, SKETCH_13_H)
    extrude(amount=EXTRUDE_7_DEPTH)

    # Эскиз17 → Бобышка-Вытянуть8 (add)
    with BuildSketch(Plane.XY.offset(11)):
        with Locations((17.9, -17.85)):
            Rectangle(SKETCH_17_W, SKETCH_17_H)
        with Locations((-17.9, -17.85)):
            Rectangle(SKETCH_17_W, SKETCH_17_H)
    extrude(amount=EXTRUDE_8_DEPTH)

    # Эскиз18 → Бобышка-Вытянуть9 (add)
    with BuildSketch(Plane(origin=(0, 0, 0), x_dir=(-1, 0, 0), z_dir=(0, 0, -1))):
        Polygon((-30, -52), (-14.4, -46.3), (-14.4, -65), (-30, -65), align=None)
        Polygon((-28.1, -55.979274058), (-24.6, -53.958548116), (-21.1, -55.979274058), (-21.1, -60.020725942), (-24.6, -62.041451884), (-28.1, -60.020725942), align=None, mode=Mode.SUBTRACT)
    extrude(amount=EXTRUDE_9_DEPTH)

    # Эскиз19 → Вырез-Вытянуть7 (cut, through all)
    with BuildSketch(Plane.ZY.offset(14.4)):
        with Locations((7.5, -13.85)):
            Rectangle(SKETCH_19_W, SKETCH_19_H)
    extrude(amount=-CUT_EXTRUDE_7_DEPTH, mode=Mode.SUBTRACT)

    # Эскиз20 → Вырез-Вытянуть8 (cut)
    with BuildSketch(Plane(origin=(0, 0, 0), x_dir=(-1, 0, 0), z_dir=(0, 0, -1))):
        with Locations((0, -12.35)):
            Rectangle(SKETCH_20_W, SKETCH_20_H)
    extrude(amount=-CUT_EXTRUDE_8_DEPTH, mode=Mode.SUBTRACT)


solid = part.part
